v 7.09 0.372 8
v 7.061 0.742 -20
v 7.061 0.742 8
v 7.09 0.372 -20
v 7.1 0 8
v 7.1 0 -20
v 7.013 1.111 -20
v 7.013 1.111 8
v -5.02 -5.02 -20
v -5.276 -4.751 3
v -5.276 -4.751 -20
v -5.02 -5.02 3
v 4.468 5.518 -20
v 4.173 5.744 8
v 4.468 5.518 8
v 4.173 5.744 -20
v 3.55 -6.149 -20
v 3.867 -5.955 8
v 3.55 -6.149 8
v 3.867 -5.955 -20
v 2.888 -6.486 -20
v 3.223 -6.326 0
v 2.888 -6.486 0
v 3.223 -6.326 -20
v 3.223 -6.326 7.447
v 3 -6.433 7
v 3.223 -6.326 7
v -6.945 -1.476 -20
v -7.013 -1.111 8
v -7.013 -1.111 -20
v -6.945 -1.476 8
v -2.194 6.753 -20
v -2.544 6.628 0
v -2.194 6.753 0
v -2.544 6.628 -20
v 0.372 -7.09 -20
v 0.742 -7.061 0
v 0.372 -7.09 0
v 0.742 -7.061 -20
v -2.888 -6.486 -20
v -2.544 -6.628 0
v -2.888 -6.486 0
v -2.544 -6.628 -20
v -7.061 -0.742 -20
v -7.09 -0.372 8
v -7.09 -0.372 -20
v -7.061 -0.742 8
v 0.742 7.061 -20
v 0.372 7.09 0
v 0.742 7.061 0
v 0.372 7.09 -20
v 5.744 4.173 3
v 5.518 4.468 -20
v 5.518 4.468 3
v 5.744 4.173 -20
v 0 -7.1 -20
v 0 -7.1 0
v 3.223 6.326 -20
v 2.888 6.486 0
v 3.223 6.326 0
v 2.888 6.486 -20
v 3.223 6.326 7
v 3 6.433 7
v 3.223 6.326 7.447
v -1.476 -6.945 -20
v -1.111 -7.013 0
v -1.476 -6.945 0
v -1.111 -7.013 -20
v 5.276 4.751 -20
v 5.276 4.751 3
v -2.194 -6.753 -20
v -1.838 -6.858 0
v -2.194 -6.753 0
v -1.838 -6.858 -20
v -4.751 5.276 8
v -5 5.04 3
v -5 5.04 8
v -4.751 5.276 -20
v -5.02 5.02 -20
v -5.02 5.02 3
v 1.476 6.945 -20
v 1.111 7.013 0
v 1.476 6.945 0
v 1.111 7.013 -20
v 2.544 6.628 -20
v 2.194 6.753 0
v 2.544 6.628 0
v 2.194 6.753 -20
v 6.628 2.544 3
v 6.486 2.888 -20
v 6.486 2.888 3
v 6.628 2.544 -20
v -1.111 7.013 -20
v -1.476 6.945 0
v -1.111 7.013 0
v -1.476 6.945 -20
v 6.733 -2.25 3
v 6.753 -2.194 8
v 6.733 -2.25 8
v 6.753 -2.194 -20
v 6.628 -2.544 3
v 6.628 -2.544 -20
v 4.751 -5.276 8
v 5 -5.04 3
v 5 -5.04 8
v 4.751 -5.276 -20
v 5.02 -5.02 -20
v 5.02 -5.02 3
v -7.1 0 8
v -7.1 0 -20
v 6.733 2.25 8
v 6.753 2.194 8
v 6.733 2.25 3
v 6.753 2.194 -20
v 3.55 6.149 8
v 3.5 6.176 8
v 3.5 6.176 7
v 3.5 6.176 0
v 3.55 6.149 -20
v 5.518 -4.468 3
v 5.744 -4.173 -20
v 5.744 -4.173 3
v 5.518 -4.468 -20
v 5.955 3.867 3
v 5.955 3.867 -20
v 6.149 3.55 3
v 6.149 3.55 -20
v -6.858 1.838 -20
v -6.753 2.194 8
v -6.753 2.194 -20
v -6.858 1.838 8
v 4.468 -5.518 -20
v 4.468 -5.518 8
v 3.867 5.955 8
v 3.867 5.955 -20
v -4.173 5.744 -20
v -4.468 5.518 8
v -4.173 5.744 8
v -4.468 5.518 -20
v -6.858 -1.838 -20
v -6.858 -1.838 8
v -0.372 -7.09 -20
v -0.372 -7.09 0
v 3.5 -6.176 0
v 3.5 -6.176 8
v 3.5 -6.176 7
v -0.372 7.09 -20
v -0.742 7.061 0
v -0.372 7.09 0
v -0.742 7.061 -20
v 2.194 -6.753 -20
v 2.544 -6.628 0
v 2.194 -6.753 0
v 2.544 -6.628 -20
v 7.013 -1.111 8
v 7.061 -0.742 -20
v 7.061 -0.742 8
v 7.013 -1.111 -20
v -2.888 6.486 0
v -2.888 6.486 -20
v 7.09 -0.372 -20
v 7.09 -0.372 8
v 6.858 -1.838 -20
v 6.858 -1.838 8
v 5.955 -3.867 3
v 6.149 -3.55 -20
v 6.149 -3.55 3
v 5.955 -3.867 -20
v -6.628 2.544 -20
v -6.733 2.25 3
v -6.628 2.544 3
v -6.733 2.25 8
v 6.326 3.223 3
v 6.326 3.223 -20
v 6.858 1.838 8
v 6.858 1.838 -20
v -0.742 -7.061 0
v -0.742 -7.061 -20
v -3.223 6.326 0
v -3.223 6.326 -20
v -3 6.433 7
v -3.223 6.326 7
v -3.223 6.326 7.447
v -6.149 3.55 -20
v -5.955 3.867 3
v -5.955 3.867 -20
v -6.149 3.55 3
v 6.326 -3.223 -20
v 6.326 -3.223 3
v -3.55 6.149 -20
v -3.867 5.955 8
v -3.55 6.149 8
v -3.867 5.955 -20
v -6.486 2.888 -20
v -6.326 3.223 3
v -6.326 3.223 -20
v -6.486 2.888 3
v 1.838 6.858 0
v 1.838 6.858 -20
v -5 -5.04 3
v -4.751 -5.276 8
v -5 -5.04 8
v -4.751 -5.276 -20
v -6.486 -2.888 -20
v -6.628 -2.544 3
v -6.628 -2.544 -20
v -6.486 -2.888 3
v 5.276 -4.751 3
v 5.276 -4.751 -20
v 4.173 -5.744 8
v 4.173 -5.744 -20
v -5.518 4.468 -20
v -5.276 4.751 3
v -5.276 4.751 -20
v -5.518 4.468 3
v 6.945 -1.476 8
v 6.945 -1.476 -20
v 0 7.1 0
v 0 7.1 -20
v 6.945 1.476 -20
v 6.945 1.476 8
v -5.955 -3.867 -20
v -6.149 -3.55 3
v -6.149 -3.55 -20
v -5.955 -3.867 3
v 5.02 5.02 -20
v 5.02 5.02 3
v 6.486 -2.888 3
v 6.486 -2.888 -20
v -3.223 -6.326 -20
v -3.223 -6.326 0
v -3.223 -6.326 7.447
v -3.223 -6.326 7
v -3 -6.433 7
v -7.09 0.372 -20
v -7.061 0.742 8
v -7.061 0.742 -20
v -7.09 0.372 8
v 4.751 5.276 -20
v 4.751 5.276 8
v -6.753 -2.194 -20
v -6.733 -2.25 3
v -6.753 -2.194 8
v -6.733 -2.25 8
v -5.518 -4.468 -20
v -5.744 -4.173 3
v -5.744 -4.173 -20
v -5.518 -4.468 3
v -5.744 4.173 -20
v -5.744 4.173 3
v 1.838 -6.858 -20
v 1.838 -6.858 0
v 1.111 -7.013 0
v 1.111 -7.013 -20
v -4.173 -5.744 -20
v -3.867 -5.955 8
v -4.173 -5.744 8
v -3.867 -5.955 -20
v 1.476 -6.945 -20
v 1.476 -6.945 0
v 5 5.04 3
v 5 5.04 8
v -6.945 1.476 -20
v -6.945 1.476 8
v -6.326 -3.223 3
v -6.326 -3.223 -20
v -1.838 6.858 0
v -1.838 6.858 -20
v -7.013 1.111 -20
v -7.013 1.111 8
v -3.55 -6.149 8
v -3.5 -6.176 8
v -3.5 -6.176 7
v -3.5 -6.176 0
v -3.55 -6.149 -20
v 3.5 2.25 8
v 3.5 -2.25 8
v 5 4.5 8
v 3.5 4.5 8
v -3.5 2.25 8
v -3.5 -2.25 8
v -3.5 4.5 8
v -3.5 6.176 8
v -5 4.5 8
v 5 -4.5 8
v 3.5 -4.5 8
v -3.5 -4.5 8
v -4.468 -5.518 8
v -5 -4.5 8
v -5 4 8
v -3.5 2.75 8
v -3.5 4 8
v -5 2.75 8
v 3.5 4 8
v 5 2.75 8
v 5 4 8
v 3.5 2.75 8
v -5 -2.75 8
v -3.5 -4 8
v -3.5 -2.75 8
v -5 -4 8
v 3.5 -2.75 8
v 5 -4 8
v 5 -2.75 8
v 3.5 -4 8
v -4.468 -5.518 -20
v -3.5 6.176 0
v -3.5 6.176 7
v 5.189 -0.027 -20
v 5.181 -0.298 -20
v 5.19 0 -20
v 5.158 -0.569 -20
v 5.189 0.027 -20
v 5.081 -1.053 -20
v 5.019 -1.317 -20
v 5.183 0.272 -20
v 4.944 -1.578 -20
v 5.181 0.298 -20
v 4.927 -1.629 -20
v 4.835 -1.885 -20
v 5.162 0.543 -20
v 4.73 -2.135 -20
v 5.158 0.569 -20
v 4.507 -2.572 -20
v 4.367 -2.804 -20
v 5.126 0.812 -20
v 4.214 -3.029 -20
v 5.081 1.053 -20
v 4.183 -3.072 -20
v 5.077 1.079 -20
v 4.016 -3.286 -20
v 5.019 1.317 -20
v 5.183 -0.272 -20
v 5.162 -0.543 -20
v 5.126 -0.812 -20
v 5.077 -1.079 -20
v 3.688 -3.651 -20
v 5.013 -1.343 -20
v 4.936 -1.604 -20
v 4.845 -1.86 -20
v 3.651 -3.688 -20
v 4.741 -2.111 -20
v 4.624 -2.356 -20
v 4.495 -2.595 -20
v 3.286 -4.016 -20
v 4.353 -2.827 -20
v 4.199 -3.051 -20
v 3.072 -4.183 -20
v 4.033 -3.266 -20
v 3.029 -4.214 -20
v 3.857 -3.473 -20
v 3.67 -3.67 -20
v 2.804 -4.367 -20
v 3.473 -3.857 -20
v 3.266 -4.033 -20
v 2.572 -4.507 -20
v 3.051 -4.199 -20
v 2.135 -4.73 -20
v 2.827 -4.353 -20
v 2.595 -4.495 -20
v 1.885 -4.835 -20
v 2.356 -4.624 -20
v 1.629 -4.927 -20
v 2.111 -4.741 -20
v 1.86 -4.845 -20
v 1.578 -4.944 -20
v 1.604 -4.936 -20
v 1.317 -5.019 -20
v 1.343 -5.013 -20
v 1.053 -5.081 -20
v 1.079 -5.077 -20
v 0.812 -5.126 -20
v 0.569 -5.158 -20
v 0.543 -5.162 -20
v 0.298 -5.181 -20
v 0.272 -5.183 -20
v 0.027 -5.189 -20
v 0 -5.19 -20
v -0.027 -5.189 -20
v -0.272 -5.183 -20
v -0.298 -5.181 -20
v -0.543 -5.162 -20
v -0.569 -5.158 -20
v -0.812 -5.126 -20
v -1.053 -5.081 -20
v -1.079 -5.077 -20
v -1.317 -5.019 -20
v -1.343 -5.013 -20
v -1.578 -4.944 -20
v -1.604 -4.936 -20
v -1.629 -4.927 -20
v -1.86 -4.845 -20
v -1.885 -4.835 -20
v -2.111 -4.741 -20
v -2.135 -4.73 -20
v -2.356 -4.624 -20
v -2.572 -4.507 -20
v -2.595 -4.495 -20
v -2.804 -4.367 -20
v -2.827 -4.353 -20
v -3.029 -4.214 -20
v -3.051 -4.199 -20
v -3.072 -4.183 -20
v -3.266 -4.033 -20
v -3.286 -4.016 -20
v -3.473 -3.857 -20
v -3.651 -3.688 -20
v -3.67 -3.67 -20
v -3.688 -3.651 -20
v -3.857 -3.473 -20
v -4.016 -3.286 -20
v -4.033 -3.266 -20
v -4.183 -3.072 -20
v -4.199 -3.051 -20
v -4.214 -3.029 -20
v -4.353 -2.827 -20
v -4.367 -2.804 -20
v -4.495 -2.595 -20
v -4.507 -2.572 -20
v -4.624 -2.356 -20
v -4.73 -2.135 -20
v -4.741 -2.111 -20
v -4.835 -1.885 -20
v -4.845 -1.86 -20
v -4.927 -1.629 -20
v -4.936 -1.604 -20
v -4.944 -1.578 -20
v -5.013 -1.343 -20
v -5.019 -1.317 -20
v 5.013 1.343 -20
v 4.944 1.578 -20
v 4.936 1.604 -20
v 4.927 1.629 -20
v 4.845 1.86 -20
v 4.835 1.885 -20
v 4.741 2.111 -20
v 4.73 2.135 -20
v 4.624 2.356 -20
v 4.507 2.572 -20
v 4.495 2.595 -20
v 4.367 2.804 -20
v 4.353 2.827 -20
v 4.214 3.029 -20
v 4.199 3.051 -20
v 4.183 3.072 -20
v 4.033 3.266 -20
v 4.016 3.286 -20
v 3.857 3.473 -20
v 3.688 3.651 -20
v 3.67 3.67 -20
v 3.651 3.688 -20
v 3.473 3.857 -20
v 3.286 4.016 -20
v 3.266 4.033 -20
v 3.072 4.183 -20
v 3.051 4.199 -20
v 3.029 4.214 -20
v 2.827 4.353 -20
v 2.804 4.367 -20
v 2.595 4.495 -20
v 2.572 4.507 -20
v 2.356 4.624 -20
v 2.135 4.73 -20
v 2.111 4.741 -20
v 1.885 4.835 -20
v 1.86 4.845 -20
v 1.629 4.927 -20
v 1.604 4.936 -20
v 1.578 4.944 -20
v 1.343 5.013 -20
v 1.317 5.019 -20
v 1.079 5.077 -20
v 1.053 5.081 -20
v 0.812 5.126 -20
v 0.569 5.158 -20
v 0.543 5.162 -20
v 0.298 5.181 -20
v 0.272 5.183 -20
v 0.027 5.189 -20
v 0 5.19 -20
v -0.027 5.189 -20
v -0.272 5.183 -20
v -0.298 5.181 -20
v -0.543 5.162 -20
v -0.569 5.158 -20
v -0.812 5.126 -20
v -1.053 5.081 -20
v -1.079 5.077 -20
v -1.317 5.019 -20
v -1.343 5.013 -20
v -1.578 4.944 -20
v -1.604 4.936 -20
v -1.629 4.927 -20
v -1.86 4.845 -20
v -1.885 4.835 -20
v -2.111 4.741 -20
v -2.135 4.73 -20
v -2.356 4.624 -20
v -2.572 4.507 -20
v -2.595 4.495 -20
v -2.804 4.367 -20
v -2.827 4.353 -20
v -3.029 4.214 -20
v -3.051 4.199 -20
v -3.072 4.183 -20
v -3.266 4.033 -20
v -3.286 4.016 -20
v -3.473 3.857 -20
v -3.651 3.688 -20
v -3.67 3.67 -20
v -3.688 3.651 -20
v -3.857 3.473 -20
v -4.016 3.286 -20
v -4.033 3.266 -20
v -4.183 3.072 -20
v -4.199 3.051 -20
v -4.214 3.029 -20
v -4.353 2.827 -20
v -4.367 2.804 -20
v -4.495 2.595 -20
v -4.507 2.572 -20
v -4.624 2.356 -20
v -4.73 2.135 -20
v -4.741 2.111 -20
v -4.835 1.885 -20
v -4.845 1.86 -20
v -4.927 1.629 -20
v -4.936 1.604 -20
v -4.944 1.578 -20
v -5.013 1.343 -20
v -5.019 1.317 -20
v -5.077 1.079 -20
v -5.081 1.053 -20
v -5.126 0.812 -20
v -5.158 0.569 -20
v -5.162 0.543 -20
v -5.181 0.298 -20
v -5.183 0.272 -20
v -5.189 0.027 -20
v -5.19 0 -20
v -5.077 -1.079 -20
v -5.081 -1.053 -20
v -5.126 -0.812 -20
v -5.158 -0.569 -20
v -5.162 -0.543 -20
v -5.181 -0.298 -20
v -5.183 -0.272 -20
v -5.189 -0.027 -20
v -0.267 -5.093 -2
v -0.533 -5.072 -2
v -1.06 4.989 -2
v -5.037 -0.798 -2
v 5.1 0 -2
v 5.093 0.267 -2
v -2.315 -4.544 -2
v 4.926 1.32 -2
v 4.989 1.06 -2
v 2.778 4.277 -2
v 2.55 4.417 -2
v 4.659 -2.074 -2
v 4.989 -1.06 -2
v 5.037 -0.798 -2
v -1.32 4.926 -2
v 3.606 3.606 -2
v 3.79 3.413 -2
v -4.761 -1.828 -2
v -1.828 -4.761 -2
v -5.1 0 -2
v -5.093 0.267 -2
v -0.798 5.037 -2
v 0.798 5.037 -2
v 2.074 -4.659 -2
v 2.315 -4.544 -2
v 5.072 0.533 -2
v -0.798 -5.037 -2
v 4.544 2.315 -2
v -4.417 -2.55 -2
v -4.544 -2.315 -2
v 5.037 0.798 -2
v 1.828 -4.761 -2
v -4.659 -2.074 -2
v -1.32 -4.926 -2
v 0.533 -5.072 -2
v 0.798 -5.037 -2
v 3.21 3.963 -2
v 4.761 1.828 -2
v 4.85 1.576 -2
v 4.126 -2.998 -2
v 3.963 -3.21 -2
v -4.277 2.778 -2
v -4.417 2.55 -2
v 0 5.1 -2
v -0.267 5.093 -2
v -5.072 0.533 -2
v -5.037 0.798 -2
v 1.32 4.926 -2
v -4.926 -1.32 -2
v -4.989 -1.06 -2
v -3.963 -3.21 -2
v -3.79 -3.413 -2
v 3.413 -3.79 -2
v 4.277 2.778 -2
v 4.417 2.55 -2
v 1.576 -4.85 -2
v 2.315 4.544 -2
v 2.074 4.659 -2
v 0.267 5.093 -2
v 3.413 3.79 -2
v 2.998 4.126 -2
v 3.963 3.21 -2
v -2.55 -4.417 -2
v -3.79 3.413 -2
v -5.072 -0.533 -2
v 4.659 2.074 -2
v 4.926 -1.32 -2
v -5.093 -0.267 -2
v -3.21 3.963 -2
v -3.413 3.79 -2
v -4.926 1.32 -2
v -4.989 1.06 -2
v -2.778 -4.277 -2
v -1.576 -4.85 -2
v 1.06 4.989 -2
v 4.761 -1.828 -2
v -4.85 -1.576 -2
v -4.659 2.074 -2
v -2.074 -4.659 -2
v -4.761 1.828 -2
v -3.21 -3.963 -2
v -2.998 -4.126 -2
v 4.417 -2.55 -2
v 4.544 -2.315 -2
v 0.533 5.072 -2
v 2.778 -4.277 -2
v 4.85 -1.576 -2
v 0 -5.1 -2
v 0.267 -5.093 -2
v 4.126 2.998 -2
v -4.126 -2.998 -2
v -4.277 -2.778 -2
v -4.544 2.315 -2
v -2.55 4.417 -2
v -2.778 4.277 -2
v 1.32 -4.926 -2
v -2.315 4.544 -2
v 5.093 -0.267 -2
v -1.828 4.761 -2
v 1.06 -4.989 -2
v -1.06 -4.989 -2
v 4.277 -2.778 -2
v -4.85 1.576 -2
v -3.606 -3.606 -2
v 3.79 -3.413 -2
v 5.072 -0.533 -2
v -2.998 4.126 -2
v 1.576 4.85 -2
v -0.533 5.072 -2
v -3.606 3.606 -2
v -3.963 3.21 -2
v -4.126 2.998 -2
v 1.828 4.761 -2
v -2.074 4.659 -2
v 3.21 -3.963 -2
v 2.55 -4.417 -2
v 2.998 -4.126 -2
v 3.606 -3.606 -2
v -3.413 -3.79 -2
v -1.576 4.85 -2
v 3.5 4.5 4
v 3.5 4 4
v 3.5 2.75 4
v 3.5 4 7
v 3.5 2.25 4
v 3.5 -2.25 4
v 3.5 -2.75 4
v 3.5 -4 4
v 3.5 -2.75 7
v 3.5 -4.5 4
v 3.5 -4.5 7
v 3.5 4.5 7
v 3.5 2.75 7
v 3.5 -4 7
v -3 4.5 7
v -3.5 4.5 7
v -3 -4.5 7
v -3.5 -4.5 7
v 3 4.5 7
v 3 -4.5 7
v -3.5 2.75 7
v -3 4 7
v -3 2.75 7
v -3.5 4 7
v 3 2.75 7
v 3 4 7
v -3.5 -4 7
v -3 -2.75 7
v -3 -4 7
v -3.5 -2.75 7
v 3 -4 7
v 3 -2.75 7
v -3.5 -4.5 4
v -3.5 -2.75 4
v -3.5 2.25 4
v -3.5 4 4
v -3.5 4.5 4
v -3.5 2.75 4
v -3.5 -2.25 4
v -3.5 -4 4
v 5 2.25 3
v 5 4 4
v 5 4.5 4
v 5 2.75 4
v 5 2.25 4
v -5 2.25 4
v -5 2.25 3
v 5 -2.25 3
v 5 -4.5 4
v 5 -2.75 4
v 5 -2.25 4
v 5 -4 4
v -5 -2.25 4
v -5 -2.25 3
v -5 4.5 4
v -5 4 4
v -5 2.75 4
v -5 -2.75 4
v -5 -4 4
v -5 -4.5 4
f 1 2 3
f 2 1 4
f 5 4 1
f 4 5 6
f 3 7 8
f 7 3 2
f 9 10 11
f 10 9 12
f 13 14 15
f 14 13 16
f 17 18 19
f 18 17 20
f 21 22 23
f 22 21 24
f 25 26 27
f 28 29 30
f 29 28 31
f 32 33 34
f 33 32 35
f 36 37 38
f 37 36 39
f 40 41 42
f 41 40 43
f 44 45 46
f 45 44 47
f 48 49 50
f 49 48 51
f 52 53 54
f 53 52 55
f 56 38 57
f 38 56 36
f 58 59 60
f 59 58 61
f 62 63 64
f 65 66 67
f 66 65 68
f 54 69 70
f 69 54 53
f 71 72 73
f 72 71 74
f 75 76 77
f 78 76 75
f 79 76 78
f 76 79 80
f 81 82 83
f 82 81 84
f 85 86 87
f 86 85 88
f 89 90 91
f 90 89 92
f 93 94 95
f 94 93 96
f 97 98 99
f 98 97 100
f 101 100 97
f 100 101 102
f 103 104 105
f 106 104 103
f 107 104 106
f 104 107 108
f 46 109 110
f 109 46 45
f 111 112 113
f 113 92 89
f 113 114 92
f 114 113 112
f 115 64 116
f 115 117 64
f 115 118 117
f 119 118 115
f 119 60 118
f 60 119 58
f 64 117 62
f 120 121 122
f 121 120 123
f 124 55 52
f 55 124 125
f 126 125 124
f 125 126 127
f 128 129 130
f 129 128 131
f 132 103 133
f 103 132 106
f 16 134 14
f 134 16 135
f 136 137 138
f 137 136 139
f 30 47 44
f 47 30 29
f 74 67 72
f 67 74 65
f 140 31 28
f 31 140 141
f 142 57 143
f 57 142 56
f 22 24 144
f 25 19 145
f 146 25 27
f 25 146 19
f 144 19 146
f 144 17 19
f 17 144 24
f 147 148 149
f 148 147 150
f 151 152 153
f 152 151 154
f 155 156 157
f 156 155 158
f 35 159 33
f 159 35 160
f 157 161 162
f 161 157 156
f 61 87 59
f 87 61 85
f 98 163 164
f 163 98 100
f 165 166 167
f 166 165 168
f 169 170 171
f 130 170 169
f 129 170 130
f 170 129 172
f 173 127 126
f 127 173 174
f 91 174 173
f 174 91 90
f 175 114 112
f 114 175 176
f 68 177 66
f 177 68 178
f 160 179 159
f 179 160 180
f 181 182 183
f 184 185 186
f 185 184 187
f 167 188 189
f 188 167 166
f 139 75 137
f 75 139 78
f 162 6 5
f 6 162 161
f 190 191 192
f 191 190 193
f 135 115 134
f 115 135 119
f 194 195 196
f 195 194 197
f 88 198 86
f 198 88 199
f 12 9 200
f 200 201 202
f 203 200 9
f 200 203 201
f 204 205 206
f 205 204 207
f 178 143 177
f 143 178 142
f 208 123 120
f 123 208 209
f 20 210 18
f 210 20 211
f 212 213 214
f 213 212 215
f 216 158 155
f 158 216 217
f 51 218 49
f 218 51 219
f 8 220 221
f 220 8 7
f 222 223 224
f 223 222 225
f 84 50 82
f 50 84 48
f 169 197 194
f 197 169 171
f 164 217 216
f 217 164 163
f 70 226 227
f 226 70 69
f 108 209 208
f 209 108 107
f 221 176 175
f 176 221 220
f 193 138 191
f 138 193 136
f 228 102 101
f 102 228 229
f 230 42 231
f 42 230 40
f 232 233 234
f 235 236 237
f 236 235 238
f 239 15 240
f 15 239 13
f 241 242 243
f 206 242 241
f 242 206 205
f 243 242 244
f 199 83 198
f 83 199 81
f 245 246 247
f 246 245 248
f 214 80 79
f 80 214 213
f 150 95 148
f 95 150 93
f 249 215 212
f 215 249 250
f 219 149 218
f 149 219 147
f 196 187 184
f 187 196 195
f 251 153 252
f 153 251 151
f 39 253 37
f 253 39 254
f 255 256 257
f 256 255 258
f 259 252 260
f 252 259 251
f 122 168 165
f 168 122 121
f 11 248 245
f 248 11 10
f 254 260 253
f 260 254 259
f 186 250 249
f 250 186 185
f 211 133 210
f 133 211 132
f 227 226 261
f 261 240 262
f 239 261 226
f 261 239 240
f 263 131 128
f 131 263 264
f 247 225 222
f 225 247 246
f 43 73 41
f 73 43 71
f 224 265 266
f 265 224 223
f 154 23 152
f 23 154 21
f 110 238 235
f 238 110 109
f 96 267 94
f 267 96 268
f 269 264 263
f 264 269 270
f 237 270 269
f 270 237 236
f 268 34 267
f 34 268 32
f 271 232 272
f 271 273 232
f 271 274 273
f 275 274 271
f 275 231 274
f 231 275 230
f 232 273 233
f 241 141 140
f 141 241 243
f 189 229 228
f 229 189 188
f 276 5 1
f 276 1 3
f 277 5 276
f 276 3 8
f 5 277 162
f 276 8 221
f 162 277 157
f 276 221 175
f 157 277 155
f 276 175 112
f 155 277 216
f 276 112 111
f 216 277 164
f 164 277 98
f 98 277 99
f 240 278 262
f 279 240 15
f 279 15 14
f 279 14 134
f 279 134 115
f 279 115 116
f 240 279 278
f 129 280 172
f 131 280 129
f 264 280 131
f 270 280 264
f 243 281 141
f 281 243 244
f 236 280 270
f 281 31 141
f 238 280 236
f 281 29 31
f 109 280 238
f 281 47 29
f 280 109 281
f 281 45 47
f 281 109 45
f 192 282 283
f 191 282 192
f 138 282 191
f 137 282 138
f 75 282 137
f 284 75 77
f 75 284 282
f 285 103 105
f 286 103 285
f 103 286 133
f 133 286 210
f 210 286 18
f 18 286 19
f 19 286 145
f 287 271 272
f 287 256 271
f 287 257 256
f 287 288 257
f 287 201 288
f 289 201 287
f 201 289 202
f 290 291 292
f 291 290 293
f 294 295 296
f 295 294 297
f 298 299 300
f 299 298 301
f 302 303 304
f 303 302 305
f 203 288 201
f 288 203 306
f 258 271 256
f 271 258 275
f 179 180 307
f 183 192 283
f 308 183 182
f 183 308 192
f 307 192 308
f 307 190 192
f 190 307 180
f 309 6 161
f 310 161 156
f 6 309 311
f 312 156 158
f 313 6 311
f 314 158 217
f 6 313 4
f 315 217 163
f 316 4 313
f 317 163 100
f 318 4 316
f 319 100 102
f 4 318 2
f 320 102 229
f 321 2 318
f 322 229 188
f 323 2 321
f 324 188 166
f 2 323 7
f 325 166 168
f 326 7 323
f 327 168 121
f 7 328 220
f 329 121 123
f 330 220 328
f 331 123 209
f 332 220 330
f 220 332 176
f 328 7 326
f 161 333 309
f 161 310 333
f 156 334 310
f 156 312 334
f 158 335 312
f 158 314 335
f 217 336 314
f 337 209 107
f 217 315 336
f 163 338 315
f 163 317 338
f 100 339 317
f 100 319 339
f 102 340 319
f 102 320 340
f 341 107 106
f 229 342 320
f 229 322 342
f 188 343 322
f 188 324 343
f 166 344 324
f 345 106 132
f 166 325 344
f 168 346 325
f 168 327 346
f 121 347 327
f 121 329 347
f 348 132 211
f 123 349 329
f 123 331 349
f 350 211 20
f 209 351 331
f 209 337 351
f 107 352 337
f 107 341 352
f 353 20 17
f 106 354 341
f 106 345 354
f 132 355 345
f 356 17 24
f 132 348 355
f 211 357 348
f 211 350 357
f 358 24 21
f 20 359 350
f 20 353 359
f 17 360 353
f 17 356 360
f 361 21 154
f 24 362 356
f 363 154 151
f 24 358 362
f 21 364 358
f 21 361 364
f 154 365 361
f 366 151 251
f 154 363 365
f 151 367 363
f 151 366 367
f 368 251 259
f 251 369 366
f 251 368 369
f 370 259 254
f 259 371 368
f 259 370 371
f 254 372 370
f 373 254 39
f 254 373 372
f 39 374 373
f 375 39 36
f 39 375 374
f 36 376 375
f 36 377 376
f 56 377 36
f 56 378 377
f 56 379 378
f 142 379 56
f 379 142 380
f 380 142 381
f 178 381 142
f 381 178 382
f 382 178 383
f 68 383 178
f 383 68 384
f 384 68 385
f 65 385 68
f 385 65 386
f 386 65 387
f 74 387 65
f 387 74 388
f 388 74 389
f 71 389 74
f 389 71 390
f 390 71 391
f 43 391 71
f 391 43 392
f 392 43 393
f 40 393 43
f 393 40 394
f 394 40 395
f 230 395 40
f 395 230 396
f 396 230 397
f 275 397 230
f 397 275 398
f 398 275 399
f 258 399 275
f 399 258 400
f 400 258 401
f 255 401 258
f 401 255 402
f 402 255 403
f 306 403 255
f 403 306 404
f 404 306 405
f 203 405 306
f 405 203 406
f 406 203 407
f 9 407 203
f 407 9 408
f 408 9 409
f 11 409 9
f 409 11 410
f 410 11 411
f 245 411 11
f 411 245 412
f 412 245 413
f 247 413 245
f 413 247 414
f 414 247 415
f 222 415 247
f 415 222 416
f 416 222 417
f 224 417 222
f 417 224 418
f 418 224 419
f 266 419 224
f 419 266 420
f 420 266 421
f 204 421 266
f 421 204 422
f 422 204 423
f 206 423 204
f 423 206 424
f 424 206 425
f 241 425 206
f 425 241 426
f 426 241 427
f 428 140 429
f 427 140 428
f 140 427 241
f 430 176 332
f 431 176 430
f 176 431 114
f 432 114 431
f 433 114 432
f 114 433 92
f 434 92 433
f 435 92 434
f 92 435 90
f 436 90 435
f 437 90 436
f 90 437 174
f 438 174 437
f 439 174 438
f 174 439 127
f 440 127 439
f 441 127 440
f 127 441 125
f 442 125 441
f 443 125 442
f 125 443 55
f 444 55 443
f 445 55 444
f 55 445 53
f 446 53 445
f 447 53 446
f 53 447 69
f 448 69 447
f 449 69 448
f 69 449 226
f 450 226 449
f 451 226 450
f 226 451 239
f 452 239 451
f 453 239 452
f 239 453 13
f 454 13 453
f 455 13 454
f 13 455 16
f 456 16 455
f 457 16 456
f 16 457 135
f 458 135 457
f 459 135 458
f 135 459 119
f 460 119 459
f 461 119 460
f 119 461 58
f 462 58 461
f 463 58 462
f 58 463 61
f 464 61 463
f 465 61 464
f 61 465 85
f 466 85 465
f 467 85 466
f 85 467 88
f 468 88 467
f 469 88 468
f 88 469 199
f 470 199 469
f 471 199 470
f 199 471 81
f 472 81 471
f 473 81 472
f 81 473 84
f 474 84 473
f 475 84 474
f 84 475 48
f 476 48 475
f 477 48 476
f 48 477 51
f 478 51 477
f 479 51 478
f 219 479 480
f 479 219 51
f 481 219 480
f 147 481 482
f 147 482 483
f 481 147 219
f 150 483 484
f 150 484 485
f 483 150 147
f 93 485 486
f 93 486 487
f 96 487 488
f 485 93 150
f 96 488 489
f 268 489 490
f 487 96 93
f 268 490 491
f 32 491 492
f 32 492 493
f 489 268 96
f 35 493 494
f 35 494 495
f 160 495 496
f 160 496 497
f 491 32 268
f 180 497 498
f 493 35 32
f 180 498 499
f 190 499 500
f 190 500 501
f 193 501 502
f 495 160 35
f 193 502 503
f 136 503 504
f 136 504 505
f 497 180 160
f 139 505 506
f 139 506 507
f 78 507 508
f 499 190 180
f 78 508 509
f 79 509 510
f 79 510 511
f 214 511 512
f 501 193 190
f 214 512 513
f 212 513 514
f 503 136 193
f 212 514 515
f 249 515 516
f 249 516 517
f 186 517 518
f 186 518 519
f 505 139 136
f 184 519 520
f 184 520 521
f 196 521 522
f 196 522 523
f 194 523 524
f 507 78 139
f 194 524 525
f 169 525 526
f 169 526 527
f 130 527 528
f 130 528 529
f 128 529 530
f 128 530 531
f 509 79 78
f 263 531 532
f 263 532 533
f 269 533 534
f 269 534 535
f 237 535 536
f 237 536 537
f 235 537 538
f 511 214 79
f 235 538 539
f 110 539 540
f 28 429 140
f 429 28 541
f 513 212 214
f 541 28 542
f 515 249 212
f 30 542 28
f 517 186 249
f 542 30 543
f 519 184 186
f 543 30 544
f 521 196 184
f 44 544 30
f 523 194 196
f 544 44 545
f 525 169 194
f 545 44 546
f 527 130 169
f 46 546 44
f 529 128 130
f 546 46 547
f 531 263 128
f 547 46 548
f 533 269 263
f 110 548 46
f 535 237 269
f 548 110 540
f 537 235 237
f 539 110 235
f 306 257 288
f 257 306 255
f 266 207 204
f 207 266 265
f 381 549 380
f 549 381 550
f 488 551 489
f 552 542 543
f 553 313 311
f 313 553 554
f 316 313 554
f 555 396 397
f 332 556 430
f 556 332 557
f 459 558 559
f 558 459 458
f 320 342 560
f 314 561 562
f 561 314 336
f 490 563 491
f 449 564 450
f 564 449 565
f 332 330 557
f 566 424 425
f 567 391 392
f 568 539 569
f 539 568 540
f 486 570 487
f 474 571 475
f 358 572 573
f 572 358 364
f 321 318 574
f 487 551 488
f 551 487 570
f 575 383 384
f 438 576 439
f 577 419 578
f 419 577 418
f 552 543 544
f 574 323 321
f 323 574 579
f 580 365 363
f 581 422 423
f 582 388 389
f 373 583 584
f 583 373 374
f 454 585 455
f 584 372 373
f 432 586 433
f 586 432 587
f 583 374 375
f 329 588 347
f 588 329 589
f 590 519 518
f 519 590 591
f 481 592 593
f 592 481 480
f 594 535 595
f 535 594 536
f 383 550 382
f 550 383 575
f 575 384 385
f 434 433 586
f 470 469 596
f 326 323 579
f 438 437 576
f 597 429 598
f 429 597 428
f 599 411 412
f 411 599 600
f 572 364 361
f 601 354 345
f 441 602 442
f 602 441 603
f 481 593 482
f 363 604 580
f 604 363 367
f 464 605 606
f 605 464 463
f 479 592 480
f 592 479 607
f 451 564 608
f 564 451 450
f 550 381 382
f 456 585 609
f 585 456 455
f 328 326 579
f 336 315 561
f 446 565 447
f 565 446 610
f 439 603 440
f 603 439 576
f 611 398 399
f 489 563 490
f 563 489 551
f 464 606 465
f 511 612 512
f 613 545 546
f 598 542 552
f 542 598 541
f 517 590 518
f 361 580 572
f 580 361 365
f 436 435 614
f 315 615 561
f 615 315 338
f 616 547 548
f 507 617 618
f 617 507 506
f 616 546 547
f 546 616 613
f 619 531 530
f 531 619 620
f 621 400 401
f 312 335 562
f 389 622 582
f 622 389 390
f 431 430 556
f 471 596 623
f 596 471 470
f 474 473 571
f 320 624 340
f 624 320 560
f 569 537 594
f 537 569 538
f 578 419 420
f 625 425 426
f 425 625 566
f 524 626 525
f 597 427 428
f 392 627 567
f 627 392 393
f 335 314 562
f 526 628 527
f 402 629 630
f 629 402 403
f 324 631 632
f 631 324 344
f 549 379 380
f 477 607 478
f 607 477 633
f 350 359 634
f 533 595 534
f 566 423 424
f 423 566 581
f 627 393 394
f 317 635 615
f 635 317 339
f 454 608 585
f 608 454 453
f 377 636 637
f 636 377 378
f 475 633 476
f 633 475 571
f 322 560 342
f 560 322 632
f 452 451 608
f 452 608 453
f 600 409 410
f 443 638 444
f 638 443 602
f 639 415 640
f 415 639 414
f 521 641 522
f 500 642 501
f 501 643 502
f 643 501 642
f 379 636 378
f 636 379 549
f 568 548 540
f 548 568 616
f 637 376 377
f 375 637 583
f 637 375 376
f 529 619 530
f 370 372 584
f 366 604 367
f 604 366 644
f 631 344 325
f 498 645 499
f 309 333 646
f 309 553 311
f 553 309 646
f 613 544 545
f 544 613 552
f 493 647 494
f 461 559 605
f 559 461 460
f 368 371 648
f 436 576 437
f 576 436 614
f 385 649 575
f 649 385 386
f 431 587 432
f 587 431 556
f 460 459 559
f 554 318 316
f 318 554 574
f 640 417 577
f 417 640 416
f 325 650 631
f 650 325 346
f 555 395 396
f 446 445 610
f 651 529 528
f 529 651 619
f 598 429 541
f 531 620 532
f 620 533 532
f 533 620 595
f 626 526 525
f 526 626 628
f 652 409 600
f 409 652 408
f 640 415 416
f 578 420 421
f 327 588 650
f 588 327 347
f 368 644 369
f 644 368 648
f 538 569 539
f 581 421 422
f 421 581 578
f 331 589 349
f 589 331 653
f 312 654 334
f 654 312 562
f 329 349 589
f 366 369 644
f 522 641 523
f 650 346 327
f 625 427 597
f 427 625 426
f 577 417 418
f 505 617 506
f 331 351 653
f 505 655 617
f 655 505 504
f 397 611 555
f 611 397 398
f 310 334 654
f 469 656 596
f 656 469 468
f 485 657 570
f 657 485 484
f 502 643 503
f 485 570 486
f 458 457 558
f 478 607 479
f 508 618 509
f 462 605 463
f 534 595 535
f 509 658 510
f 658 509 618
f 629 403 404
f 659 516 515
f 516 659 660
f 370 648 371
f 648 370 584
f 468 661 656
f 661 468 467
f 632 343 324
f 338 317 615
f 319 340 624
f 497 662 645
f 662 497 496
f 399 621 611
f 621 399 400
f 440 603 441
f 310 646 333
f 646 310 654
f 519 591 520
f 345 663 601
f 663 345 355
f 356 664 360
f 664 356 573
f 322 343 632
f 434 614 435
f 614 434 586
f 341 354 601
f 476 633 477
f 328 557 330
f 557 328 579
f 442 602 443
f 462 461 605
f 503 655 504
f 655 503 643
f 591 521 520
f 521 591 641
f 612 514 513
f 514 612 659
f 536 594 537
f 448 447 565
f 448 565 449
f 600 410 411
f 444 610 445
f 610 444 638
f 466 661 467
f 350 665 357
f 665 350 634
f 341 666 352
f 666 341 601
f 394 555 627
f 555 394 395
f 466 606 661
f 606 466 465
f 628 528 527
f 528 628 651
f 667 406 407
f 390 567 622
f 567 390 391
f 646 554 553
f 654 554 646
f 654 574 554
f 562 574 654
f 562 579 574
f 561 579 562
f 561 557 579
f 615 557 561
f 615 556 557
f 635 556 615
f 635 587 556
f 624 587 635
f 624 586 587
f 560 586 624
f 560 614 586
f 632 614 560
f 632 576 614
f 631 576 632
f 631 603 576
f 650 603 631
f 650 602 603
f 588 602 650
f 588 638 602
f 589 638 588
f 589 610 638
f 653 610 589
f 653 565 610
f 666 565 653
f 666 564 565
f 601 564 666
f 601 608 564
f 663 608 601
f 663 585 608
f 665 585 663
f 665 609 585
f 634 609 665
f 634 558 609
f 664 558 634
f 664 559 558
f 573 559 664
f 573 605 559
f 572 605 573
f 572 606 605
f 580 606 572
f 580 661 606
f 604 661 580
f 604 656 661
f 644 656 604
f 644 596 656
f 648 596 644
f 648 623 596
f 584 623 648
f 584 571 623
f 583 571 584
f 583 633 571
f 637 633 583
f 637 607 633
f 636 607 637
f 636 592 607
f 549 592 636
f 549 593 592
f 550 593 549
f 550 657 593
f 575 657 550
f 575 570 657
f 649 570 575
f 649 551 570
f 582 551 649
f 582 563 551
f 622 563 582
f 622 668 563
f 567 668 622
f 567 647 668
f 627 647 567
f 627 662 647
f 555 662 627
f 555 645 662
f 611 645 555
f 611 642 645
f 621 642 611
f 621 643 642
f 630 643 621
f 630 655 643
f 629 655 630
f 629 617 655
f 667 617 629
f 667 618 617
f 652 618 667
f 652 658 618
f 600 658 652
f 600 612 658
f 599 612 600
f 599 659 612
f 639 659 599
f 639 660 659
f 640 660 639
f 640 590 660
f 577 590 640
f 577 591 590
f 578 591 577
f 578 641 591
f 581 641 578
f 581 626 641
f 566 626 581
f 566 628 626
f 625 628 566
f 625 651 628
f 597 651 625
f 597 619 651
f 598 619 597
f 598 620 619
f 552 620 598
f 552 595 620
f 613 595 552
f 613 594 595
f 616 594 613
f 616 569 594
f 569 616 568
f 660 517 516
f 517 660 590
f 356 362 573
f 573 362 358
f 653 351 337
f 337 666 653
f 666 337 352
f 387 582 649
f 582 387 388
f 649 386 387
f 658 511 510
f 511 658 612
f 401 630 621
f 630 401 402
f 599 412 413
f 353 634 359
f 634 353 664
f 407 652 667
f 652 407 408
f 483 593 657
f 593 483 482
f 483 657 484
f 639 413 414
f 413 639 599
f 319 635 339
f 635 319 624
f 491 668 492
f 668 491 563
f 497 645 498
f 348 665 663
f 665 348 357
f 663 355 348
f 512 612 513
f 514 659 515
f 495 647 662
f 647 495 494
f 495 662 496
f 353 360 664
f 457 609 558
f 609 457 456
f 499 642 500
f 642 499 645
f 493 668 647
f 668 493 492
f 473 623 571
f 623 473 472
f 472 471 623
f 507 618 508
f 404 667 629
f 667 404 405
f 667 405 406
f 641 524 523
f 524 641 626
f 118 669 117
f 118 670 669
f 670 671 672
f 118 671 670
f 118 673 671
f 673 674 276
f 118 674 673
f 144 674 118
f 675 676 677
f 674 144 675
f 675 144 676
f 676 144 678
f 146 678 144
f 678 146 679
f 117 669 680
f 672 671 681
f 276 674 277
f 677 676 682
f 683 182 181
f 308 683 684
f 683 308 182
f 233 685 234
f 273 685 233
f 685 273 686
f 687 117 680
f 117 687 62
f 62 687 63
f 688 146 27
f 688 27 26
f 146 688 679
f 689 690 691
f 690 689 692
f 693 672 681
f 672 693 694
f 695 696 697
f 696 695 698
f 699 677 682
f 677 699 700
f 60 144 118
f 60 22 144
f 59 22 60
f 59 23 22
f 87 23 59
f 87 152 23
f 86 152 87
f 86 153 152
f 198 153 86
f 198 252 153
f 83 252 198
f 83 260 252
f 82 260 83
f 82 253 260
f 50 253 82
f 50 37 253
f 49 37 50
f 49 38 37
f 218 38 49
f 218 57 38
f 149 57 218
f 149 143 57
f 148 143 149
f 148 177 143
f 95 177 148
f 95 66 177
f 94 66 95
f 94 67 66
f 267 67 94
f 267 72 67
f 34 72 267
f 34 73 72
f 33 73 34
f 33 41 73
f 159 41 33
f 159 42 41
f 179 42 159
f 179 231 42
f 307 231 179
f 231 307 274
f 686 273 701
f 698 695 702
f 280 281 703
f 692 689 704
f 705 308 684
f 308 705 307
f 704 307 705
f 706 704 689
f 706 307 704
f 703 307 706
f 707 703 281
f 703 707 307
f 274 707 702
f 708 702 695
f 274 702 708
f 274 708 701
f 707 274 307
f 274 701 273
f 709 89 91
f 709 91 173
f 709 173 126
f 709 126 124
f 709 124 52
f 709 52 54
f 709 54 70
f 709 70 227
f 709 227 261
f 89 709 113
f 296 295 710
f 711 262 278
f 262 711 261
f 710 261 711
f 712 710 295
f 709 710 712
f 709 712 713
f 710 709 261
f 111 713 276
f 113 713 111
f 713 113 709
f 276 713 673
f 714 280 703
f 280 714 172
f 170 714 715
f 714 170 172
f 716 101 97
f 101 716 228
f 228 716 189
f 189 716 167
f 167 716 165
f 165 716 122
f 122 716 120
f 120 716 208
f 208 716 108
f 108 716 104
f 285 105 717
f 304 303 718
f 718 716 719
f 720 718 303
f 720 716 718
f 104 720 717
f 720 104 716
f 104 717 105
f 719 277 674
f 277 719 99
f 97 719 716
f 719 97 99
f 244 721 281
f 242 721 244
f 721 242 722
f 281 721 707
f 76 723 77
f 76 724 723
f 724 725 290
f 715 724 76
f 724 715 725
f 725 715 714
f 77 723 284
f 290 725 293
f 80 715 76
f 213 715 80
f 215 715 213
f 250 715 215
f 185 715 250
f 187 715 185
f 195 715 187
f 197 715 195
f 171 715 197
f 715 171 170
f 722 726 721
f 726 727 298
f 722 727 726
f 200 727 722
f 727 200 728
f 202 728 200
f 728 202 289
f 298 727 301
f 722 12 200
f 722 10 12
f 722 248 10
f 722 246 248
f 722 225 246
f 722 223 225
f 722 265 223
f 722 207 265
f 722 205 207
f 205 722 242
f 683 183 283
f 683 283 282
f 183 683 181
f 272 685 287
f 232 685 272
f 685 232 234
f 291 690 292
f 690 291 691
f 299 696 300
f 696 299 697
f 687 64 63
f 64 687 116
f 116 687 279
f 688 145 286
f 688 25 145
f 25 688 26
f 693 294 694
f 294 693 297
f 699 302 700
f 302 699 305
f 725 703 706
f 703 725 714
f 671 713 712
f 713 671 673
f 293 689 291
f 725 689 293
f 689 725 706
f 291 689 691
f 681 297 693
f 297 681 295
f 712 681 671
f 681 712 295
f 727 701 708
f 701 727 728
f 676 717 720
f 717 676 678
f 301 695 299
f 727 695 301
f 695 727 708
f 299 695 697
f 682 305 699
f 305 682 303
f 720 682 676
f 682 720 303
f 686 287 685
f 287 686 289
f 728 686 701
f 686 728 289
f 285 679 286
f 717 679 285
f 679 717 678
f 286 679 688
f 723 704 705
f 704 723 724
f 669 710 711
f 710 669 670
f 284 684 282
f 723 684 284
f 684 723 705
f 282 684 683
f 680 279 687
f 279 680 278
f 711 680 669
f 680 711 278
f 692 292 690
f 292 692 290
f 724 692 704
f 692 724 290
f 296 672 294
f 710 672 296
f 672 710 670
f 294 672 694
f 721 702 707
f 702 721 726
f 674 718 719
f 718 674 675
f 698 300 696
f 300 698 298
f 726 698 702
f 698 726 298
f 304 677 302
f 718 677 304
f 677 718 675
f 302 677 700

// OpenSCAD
$fn= 120;
dia = 10.2;
render = 3;

module hub(dia) {
  difference() {
      union() {
        translate([0, 0, -20]) cylinder(d = dia + 4, h = 28);
      }  
      translate([0, 0, -22]) cylinder(d1 = dia +0.2 ,d2 = dia  , h = 20);
      translate([0, 0, 3.5]) cube([7,20,7], center=true);

      
      translate([8.5, 4.75, 8]) cube([7,5,10], center=true);
      translate([8.5, -4.75, 8]) cube([7,5,10], center=true);
      translate([-8.5, 4.75, 8]) cube([7,5,10], center=true);
      translate([-8.5, -4.75, 8]) cube([7,5,10], center=true);
    
      translate([0, 0, 8])
        rotate([270,0, 0])
          linear_extrude(height=20, center=true)
            polygon([[-3.5, 0], [3.5, 0], [3, 1], [-3, 1]]);

      translate([0,2.5,9])cube([20, .5, 10], center=true);
      translate([0,-4.25,9])cube([20, .5, 10], center=true);
      translate([0,4.25,9])cube([20, .5, 10], center=true);
      translate([0,-2.5,9])cube([20, .5, 10], center=true);

      translate([0, 0, 7]) cube([7,5,7], center=true);
  }

}

module snap() {
  difference() {
      translate([0, 0, -1]) cylinder(d = dia + 4.2, h = 6);
      for(i = [0: 60: 300]) {
          translate([sin(i) * ((dia / 2) + 8.5), cos(i) * ((dia / 2) + 8.5), -15]) cylinder(r=2.5, h=30);  
      }
      for(i = [30: 60: 330]) {
          translate([sin(i) * ((dia / 2) + 8.5), cos(i) * ((dia / 2) + 8.5), -15]) cylinder(r=1.5, h=30);  
      }

  }
}

if (render == 1 || render >= 3) hub(dia);
// if (render == 2 || render >= 3) color("red") snap();
